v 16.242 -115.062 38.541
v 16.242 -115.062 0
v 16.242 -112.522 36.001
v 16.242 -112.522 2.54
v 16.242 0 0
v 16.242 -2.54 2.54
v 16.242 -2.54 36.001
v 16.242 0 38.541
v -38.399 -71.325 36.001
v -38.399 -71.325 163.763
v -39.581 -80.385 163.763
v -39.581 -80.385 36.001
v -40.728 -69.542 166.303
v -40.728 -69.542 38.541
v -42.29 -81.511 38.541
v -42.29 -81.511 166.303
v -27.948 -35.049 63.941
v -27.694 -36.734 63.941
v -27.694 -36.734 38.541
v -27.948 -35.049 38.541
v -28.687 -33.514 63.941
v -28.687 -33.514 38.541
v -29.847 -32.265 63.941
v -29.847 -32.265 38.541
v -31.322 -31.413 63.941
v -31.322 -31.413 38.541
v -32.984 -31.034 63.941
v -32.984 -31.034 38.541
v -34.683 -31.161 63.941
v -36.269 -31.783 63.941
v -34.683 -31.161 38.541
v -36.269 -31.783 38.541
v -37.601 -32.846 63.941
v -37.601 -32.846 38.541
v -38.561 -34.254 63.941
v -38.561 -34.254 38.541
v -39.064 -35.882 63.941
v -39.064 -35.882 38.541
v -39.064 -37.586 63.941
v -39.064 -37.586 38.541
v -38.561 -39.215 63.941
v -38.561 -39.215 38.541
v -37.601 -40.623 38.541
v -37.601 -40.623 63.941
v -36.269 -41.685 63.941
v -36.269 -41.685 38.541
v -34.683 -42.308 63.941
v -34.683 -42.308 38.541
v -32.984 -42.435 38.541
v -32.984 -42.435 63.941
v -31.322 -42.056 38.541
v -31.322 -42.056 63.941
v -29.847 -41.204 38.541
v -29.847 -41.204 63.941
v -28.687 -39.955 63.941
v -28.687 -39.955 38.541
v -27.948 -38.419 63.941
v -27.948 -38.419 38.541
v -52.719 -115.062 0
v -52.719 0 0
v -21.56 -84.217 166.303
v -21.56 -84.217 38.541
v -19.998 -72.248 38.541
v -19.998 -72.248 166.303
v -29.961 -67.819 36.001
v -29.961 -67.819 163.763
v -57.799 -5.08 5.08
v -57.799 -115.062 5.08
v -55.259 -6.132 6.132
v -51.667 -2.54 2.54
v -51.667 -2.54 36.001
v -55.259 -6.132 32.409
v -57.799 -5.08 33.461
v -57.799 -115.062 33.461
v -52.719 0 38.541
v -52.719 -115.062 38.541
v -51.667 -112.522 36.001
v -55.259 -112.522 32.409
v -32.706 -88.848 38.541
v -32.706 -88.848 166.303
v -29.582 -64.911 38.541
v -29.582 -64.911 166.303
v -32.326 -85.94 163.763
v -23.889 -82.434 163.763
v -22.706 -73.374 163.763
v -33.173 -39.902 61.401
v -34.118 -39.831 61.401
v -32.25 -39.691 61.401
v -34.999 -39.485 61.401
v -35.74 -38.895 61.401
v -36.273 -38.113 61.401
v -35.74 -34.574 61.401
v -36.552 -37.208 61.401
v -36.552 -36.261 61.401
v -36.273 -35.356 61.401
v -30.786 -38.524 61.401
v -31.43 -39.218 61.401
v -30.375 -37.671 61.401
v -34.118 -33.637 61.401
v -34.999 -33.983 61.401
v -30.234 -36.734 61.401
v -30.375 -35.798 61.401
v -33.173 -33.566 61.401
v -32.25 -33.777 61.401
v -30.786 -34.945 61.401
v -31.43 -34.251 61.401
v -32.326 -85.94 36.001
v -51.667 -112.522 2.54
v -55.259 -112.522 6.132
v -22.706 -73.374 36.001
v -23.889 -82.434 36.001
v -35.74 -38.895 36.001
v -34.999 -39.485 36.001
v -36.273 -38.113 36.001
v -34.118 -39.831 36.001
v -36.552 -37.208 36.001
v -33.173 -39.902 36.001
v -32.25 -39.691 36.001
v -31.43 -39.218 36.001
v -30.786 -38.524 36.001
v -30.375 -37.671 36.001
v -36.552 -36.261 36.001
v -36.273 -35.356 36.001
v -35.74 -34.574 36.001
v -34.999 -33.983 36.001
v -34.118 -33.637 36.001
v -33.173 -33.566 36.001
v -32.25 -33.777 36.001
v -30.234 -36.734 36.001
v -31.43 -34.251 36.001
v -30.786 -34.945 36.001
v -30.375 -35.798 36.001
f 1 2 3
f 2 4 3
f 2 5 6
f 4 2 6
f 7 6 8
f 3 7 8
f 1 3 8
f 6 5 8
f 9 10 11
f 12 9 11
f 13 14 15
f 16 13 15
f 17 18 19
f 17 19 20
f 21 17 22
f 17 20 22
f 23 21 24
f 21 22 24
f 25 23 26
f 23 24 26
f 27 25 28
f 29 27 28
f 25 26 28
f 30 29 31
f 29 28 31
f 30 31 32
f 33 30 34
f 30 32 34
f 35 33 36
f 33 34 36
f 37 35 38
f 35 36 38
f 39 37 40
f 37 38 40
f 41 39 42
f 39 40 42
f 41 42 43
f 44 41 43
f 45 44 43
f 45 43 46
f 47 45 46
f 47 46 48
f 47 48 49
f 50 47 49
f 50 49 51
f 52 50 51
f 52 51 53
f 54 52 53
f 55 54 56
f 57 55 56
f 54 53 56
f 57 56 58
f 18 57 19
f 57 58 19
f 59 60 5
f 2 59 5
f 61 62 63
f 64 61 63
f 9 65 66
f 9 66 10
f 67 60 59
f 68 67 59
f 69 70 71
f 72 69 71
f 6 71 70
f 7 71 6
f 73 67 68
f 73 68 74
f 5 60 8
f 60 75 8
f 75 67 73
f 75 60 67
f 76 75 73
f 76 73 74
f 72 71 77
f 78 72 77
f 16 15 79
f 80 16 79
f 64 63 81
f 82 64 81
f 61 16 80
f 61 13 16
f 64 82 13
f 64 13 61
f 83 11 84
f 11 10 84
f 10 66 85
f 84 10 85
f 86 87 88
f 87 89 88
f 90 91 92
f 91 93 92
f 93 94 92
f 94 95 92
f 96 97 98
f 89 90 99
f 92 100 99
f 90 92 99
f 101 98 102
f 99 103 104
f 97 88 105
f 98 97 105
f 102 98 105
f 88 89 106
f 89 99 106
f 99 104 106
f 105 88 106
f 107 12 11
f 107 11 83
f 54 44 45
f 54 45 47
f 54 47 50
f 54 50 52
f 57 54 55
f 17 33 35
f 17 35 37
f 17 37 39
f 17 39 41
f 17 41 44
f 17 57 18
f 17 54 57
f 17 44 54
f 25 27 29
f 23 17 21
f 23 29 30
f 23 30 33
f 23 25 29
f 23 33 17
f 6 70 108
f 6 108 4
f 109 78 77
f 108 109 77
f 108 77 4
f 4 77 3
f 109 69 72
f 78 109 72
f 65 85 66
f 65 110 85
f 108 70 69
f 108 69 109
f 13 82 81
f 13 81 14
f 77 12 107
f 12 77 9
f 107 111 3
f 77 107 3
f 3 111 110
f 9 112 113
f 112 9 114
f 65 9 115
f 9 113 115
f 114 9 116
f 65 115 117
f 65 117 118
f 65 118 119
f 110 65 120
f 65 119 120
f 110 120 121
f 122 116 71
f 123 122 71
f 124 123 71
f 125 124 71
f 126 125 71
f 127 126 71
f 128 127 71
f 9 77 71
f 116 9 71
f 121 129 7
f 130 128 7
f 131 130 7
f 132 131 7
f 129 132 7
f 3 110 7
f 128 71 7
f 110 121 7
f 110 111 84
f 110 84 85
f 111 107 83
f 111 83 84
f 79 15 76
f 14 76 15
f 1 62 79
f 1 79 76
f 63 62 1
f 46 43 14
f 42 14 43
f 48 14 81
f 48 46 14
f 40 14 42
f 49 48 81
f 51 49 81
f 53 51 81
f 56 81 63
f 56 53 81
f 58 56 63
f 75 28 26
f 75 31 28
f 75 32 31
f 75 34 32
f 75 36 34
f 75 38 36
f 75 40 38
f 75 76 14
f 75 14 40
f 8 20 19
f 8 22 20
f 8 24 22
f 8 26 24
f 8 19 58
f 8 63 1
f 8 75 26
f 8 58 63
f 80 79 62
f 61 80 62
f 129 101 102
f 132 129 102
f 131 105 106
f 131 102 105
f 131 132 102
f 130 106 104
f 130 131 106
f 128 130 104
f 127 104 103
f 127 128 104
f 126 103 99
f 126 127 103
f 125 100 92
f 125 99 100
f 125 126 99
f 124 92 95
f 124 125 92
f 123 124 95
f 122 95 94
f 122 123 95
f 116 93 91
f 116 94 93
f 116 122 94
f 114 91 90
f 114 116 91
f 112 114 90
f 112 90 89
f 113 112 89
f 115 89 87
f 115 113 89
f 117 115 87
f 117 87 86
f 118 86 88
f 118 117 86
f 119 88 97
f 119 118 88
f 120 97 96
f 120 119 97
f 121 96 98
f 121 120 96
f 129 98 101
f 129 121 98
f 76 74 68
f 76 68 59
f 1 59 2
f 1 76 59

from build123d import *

# Parameters (mm, degrees)
F0_W     = 74.041
F0_H     = 38.5406240821
F1_DEPTH = 115.062
F3_DEPTH = 127.762
F4_R     = 5.7167029037
F5_DEPTH = 25.4
F6_SIZE  = 5.08
F7_SIZE  = 5.08
F8_T     = -2.54


with BuildPart() as f1:
    # F0 (on Front) → F1 (new body)
    with BuildSketch(Plane.XZ):
        with Locations((-20.778500293, 19.270312041)):
            Rectangle(F0_W, F0_H)
    extrude(amount=F1_DEPTH)

    # F2 (on face) → F3 (join)
    with BuildSketch(Plane.XY.offset(38.5406240821)):
        Polygon((-42.2897917902, -81.5107752422), (-32.7059420073, -88.8478676936), (-21.5599086631, -84.2165565412), (-19.9977251018, -72.2481529375), (-29.5815748846, -64.9110604862), (-40.7276082288, -69.5423716385), align=None)
    extrude(amount=F3_DEPTH)

    # F4 (on face) → F5 (join)
    with BuildSketch(Plane.XY.offset(38.5406240821)):
        with Locations((-33.4108434618, -36.7342457175)):
            Circle(F4_R)
    extrude(amount=F5_DEPTH)

    # F6
    f6_edges = [f1.edges().sort_by_distance(p)[0] for p in [
        (-57.799, -57.531, 0),
        (-57.799, 0, 19.270312),
    ]]
    chamfer(f6_edges, length=F6_SIZE)

    # F7
    f7_edges = [f1.edges().sort_by_distance(p)[0] for p in [
        (-57.799, -60.071, 38.540624),
    ]]
    chamfer(f7_edges, length=F7_SIZE)

    # F8
    f8_openings = [f1.faces().sort_by_distance(p)[0] for p in [
        (16.242, -57.531, 19.270312),
    ]]
    offset(amount=F8_T, openings=f8_openings, kind=Kind.INTERSECTION)


solid = f1.part
